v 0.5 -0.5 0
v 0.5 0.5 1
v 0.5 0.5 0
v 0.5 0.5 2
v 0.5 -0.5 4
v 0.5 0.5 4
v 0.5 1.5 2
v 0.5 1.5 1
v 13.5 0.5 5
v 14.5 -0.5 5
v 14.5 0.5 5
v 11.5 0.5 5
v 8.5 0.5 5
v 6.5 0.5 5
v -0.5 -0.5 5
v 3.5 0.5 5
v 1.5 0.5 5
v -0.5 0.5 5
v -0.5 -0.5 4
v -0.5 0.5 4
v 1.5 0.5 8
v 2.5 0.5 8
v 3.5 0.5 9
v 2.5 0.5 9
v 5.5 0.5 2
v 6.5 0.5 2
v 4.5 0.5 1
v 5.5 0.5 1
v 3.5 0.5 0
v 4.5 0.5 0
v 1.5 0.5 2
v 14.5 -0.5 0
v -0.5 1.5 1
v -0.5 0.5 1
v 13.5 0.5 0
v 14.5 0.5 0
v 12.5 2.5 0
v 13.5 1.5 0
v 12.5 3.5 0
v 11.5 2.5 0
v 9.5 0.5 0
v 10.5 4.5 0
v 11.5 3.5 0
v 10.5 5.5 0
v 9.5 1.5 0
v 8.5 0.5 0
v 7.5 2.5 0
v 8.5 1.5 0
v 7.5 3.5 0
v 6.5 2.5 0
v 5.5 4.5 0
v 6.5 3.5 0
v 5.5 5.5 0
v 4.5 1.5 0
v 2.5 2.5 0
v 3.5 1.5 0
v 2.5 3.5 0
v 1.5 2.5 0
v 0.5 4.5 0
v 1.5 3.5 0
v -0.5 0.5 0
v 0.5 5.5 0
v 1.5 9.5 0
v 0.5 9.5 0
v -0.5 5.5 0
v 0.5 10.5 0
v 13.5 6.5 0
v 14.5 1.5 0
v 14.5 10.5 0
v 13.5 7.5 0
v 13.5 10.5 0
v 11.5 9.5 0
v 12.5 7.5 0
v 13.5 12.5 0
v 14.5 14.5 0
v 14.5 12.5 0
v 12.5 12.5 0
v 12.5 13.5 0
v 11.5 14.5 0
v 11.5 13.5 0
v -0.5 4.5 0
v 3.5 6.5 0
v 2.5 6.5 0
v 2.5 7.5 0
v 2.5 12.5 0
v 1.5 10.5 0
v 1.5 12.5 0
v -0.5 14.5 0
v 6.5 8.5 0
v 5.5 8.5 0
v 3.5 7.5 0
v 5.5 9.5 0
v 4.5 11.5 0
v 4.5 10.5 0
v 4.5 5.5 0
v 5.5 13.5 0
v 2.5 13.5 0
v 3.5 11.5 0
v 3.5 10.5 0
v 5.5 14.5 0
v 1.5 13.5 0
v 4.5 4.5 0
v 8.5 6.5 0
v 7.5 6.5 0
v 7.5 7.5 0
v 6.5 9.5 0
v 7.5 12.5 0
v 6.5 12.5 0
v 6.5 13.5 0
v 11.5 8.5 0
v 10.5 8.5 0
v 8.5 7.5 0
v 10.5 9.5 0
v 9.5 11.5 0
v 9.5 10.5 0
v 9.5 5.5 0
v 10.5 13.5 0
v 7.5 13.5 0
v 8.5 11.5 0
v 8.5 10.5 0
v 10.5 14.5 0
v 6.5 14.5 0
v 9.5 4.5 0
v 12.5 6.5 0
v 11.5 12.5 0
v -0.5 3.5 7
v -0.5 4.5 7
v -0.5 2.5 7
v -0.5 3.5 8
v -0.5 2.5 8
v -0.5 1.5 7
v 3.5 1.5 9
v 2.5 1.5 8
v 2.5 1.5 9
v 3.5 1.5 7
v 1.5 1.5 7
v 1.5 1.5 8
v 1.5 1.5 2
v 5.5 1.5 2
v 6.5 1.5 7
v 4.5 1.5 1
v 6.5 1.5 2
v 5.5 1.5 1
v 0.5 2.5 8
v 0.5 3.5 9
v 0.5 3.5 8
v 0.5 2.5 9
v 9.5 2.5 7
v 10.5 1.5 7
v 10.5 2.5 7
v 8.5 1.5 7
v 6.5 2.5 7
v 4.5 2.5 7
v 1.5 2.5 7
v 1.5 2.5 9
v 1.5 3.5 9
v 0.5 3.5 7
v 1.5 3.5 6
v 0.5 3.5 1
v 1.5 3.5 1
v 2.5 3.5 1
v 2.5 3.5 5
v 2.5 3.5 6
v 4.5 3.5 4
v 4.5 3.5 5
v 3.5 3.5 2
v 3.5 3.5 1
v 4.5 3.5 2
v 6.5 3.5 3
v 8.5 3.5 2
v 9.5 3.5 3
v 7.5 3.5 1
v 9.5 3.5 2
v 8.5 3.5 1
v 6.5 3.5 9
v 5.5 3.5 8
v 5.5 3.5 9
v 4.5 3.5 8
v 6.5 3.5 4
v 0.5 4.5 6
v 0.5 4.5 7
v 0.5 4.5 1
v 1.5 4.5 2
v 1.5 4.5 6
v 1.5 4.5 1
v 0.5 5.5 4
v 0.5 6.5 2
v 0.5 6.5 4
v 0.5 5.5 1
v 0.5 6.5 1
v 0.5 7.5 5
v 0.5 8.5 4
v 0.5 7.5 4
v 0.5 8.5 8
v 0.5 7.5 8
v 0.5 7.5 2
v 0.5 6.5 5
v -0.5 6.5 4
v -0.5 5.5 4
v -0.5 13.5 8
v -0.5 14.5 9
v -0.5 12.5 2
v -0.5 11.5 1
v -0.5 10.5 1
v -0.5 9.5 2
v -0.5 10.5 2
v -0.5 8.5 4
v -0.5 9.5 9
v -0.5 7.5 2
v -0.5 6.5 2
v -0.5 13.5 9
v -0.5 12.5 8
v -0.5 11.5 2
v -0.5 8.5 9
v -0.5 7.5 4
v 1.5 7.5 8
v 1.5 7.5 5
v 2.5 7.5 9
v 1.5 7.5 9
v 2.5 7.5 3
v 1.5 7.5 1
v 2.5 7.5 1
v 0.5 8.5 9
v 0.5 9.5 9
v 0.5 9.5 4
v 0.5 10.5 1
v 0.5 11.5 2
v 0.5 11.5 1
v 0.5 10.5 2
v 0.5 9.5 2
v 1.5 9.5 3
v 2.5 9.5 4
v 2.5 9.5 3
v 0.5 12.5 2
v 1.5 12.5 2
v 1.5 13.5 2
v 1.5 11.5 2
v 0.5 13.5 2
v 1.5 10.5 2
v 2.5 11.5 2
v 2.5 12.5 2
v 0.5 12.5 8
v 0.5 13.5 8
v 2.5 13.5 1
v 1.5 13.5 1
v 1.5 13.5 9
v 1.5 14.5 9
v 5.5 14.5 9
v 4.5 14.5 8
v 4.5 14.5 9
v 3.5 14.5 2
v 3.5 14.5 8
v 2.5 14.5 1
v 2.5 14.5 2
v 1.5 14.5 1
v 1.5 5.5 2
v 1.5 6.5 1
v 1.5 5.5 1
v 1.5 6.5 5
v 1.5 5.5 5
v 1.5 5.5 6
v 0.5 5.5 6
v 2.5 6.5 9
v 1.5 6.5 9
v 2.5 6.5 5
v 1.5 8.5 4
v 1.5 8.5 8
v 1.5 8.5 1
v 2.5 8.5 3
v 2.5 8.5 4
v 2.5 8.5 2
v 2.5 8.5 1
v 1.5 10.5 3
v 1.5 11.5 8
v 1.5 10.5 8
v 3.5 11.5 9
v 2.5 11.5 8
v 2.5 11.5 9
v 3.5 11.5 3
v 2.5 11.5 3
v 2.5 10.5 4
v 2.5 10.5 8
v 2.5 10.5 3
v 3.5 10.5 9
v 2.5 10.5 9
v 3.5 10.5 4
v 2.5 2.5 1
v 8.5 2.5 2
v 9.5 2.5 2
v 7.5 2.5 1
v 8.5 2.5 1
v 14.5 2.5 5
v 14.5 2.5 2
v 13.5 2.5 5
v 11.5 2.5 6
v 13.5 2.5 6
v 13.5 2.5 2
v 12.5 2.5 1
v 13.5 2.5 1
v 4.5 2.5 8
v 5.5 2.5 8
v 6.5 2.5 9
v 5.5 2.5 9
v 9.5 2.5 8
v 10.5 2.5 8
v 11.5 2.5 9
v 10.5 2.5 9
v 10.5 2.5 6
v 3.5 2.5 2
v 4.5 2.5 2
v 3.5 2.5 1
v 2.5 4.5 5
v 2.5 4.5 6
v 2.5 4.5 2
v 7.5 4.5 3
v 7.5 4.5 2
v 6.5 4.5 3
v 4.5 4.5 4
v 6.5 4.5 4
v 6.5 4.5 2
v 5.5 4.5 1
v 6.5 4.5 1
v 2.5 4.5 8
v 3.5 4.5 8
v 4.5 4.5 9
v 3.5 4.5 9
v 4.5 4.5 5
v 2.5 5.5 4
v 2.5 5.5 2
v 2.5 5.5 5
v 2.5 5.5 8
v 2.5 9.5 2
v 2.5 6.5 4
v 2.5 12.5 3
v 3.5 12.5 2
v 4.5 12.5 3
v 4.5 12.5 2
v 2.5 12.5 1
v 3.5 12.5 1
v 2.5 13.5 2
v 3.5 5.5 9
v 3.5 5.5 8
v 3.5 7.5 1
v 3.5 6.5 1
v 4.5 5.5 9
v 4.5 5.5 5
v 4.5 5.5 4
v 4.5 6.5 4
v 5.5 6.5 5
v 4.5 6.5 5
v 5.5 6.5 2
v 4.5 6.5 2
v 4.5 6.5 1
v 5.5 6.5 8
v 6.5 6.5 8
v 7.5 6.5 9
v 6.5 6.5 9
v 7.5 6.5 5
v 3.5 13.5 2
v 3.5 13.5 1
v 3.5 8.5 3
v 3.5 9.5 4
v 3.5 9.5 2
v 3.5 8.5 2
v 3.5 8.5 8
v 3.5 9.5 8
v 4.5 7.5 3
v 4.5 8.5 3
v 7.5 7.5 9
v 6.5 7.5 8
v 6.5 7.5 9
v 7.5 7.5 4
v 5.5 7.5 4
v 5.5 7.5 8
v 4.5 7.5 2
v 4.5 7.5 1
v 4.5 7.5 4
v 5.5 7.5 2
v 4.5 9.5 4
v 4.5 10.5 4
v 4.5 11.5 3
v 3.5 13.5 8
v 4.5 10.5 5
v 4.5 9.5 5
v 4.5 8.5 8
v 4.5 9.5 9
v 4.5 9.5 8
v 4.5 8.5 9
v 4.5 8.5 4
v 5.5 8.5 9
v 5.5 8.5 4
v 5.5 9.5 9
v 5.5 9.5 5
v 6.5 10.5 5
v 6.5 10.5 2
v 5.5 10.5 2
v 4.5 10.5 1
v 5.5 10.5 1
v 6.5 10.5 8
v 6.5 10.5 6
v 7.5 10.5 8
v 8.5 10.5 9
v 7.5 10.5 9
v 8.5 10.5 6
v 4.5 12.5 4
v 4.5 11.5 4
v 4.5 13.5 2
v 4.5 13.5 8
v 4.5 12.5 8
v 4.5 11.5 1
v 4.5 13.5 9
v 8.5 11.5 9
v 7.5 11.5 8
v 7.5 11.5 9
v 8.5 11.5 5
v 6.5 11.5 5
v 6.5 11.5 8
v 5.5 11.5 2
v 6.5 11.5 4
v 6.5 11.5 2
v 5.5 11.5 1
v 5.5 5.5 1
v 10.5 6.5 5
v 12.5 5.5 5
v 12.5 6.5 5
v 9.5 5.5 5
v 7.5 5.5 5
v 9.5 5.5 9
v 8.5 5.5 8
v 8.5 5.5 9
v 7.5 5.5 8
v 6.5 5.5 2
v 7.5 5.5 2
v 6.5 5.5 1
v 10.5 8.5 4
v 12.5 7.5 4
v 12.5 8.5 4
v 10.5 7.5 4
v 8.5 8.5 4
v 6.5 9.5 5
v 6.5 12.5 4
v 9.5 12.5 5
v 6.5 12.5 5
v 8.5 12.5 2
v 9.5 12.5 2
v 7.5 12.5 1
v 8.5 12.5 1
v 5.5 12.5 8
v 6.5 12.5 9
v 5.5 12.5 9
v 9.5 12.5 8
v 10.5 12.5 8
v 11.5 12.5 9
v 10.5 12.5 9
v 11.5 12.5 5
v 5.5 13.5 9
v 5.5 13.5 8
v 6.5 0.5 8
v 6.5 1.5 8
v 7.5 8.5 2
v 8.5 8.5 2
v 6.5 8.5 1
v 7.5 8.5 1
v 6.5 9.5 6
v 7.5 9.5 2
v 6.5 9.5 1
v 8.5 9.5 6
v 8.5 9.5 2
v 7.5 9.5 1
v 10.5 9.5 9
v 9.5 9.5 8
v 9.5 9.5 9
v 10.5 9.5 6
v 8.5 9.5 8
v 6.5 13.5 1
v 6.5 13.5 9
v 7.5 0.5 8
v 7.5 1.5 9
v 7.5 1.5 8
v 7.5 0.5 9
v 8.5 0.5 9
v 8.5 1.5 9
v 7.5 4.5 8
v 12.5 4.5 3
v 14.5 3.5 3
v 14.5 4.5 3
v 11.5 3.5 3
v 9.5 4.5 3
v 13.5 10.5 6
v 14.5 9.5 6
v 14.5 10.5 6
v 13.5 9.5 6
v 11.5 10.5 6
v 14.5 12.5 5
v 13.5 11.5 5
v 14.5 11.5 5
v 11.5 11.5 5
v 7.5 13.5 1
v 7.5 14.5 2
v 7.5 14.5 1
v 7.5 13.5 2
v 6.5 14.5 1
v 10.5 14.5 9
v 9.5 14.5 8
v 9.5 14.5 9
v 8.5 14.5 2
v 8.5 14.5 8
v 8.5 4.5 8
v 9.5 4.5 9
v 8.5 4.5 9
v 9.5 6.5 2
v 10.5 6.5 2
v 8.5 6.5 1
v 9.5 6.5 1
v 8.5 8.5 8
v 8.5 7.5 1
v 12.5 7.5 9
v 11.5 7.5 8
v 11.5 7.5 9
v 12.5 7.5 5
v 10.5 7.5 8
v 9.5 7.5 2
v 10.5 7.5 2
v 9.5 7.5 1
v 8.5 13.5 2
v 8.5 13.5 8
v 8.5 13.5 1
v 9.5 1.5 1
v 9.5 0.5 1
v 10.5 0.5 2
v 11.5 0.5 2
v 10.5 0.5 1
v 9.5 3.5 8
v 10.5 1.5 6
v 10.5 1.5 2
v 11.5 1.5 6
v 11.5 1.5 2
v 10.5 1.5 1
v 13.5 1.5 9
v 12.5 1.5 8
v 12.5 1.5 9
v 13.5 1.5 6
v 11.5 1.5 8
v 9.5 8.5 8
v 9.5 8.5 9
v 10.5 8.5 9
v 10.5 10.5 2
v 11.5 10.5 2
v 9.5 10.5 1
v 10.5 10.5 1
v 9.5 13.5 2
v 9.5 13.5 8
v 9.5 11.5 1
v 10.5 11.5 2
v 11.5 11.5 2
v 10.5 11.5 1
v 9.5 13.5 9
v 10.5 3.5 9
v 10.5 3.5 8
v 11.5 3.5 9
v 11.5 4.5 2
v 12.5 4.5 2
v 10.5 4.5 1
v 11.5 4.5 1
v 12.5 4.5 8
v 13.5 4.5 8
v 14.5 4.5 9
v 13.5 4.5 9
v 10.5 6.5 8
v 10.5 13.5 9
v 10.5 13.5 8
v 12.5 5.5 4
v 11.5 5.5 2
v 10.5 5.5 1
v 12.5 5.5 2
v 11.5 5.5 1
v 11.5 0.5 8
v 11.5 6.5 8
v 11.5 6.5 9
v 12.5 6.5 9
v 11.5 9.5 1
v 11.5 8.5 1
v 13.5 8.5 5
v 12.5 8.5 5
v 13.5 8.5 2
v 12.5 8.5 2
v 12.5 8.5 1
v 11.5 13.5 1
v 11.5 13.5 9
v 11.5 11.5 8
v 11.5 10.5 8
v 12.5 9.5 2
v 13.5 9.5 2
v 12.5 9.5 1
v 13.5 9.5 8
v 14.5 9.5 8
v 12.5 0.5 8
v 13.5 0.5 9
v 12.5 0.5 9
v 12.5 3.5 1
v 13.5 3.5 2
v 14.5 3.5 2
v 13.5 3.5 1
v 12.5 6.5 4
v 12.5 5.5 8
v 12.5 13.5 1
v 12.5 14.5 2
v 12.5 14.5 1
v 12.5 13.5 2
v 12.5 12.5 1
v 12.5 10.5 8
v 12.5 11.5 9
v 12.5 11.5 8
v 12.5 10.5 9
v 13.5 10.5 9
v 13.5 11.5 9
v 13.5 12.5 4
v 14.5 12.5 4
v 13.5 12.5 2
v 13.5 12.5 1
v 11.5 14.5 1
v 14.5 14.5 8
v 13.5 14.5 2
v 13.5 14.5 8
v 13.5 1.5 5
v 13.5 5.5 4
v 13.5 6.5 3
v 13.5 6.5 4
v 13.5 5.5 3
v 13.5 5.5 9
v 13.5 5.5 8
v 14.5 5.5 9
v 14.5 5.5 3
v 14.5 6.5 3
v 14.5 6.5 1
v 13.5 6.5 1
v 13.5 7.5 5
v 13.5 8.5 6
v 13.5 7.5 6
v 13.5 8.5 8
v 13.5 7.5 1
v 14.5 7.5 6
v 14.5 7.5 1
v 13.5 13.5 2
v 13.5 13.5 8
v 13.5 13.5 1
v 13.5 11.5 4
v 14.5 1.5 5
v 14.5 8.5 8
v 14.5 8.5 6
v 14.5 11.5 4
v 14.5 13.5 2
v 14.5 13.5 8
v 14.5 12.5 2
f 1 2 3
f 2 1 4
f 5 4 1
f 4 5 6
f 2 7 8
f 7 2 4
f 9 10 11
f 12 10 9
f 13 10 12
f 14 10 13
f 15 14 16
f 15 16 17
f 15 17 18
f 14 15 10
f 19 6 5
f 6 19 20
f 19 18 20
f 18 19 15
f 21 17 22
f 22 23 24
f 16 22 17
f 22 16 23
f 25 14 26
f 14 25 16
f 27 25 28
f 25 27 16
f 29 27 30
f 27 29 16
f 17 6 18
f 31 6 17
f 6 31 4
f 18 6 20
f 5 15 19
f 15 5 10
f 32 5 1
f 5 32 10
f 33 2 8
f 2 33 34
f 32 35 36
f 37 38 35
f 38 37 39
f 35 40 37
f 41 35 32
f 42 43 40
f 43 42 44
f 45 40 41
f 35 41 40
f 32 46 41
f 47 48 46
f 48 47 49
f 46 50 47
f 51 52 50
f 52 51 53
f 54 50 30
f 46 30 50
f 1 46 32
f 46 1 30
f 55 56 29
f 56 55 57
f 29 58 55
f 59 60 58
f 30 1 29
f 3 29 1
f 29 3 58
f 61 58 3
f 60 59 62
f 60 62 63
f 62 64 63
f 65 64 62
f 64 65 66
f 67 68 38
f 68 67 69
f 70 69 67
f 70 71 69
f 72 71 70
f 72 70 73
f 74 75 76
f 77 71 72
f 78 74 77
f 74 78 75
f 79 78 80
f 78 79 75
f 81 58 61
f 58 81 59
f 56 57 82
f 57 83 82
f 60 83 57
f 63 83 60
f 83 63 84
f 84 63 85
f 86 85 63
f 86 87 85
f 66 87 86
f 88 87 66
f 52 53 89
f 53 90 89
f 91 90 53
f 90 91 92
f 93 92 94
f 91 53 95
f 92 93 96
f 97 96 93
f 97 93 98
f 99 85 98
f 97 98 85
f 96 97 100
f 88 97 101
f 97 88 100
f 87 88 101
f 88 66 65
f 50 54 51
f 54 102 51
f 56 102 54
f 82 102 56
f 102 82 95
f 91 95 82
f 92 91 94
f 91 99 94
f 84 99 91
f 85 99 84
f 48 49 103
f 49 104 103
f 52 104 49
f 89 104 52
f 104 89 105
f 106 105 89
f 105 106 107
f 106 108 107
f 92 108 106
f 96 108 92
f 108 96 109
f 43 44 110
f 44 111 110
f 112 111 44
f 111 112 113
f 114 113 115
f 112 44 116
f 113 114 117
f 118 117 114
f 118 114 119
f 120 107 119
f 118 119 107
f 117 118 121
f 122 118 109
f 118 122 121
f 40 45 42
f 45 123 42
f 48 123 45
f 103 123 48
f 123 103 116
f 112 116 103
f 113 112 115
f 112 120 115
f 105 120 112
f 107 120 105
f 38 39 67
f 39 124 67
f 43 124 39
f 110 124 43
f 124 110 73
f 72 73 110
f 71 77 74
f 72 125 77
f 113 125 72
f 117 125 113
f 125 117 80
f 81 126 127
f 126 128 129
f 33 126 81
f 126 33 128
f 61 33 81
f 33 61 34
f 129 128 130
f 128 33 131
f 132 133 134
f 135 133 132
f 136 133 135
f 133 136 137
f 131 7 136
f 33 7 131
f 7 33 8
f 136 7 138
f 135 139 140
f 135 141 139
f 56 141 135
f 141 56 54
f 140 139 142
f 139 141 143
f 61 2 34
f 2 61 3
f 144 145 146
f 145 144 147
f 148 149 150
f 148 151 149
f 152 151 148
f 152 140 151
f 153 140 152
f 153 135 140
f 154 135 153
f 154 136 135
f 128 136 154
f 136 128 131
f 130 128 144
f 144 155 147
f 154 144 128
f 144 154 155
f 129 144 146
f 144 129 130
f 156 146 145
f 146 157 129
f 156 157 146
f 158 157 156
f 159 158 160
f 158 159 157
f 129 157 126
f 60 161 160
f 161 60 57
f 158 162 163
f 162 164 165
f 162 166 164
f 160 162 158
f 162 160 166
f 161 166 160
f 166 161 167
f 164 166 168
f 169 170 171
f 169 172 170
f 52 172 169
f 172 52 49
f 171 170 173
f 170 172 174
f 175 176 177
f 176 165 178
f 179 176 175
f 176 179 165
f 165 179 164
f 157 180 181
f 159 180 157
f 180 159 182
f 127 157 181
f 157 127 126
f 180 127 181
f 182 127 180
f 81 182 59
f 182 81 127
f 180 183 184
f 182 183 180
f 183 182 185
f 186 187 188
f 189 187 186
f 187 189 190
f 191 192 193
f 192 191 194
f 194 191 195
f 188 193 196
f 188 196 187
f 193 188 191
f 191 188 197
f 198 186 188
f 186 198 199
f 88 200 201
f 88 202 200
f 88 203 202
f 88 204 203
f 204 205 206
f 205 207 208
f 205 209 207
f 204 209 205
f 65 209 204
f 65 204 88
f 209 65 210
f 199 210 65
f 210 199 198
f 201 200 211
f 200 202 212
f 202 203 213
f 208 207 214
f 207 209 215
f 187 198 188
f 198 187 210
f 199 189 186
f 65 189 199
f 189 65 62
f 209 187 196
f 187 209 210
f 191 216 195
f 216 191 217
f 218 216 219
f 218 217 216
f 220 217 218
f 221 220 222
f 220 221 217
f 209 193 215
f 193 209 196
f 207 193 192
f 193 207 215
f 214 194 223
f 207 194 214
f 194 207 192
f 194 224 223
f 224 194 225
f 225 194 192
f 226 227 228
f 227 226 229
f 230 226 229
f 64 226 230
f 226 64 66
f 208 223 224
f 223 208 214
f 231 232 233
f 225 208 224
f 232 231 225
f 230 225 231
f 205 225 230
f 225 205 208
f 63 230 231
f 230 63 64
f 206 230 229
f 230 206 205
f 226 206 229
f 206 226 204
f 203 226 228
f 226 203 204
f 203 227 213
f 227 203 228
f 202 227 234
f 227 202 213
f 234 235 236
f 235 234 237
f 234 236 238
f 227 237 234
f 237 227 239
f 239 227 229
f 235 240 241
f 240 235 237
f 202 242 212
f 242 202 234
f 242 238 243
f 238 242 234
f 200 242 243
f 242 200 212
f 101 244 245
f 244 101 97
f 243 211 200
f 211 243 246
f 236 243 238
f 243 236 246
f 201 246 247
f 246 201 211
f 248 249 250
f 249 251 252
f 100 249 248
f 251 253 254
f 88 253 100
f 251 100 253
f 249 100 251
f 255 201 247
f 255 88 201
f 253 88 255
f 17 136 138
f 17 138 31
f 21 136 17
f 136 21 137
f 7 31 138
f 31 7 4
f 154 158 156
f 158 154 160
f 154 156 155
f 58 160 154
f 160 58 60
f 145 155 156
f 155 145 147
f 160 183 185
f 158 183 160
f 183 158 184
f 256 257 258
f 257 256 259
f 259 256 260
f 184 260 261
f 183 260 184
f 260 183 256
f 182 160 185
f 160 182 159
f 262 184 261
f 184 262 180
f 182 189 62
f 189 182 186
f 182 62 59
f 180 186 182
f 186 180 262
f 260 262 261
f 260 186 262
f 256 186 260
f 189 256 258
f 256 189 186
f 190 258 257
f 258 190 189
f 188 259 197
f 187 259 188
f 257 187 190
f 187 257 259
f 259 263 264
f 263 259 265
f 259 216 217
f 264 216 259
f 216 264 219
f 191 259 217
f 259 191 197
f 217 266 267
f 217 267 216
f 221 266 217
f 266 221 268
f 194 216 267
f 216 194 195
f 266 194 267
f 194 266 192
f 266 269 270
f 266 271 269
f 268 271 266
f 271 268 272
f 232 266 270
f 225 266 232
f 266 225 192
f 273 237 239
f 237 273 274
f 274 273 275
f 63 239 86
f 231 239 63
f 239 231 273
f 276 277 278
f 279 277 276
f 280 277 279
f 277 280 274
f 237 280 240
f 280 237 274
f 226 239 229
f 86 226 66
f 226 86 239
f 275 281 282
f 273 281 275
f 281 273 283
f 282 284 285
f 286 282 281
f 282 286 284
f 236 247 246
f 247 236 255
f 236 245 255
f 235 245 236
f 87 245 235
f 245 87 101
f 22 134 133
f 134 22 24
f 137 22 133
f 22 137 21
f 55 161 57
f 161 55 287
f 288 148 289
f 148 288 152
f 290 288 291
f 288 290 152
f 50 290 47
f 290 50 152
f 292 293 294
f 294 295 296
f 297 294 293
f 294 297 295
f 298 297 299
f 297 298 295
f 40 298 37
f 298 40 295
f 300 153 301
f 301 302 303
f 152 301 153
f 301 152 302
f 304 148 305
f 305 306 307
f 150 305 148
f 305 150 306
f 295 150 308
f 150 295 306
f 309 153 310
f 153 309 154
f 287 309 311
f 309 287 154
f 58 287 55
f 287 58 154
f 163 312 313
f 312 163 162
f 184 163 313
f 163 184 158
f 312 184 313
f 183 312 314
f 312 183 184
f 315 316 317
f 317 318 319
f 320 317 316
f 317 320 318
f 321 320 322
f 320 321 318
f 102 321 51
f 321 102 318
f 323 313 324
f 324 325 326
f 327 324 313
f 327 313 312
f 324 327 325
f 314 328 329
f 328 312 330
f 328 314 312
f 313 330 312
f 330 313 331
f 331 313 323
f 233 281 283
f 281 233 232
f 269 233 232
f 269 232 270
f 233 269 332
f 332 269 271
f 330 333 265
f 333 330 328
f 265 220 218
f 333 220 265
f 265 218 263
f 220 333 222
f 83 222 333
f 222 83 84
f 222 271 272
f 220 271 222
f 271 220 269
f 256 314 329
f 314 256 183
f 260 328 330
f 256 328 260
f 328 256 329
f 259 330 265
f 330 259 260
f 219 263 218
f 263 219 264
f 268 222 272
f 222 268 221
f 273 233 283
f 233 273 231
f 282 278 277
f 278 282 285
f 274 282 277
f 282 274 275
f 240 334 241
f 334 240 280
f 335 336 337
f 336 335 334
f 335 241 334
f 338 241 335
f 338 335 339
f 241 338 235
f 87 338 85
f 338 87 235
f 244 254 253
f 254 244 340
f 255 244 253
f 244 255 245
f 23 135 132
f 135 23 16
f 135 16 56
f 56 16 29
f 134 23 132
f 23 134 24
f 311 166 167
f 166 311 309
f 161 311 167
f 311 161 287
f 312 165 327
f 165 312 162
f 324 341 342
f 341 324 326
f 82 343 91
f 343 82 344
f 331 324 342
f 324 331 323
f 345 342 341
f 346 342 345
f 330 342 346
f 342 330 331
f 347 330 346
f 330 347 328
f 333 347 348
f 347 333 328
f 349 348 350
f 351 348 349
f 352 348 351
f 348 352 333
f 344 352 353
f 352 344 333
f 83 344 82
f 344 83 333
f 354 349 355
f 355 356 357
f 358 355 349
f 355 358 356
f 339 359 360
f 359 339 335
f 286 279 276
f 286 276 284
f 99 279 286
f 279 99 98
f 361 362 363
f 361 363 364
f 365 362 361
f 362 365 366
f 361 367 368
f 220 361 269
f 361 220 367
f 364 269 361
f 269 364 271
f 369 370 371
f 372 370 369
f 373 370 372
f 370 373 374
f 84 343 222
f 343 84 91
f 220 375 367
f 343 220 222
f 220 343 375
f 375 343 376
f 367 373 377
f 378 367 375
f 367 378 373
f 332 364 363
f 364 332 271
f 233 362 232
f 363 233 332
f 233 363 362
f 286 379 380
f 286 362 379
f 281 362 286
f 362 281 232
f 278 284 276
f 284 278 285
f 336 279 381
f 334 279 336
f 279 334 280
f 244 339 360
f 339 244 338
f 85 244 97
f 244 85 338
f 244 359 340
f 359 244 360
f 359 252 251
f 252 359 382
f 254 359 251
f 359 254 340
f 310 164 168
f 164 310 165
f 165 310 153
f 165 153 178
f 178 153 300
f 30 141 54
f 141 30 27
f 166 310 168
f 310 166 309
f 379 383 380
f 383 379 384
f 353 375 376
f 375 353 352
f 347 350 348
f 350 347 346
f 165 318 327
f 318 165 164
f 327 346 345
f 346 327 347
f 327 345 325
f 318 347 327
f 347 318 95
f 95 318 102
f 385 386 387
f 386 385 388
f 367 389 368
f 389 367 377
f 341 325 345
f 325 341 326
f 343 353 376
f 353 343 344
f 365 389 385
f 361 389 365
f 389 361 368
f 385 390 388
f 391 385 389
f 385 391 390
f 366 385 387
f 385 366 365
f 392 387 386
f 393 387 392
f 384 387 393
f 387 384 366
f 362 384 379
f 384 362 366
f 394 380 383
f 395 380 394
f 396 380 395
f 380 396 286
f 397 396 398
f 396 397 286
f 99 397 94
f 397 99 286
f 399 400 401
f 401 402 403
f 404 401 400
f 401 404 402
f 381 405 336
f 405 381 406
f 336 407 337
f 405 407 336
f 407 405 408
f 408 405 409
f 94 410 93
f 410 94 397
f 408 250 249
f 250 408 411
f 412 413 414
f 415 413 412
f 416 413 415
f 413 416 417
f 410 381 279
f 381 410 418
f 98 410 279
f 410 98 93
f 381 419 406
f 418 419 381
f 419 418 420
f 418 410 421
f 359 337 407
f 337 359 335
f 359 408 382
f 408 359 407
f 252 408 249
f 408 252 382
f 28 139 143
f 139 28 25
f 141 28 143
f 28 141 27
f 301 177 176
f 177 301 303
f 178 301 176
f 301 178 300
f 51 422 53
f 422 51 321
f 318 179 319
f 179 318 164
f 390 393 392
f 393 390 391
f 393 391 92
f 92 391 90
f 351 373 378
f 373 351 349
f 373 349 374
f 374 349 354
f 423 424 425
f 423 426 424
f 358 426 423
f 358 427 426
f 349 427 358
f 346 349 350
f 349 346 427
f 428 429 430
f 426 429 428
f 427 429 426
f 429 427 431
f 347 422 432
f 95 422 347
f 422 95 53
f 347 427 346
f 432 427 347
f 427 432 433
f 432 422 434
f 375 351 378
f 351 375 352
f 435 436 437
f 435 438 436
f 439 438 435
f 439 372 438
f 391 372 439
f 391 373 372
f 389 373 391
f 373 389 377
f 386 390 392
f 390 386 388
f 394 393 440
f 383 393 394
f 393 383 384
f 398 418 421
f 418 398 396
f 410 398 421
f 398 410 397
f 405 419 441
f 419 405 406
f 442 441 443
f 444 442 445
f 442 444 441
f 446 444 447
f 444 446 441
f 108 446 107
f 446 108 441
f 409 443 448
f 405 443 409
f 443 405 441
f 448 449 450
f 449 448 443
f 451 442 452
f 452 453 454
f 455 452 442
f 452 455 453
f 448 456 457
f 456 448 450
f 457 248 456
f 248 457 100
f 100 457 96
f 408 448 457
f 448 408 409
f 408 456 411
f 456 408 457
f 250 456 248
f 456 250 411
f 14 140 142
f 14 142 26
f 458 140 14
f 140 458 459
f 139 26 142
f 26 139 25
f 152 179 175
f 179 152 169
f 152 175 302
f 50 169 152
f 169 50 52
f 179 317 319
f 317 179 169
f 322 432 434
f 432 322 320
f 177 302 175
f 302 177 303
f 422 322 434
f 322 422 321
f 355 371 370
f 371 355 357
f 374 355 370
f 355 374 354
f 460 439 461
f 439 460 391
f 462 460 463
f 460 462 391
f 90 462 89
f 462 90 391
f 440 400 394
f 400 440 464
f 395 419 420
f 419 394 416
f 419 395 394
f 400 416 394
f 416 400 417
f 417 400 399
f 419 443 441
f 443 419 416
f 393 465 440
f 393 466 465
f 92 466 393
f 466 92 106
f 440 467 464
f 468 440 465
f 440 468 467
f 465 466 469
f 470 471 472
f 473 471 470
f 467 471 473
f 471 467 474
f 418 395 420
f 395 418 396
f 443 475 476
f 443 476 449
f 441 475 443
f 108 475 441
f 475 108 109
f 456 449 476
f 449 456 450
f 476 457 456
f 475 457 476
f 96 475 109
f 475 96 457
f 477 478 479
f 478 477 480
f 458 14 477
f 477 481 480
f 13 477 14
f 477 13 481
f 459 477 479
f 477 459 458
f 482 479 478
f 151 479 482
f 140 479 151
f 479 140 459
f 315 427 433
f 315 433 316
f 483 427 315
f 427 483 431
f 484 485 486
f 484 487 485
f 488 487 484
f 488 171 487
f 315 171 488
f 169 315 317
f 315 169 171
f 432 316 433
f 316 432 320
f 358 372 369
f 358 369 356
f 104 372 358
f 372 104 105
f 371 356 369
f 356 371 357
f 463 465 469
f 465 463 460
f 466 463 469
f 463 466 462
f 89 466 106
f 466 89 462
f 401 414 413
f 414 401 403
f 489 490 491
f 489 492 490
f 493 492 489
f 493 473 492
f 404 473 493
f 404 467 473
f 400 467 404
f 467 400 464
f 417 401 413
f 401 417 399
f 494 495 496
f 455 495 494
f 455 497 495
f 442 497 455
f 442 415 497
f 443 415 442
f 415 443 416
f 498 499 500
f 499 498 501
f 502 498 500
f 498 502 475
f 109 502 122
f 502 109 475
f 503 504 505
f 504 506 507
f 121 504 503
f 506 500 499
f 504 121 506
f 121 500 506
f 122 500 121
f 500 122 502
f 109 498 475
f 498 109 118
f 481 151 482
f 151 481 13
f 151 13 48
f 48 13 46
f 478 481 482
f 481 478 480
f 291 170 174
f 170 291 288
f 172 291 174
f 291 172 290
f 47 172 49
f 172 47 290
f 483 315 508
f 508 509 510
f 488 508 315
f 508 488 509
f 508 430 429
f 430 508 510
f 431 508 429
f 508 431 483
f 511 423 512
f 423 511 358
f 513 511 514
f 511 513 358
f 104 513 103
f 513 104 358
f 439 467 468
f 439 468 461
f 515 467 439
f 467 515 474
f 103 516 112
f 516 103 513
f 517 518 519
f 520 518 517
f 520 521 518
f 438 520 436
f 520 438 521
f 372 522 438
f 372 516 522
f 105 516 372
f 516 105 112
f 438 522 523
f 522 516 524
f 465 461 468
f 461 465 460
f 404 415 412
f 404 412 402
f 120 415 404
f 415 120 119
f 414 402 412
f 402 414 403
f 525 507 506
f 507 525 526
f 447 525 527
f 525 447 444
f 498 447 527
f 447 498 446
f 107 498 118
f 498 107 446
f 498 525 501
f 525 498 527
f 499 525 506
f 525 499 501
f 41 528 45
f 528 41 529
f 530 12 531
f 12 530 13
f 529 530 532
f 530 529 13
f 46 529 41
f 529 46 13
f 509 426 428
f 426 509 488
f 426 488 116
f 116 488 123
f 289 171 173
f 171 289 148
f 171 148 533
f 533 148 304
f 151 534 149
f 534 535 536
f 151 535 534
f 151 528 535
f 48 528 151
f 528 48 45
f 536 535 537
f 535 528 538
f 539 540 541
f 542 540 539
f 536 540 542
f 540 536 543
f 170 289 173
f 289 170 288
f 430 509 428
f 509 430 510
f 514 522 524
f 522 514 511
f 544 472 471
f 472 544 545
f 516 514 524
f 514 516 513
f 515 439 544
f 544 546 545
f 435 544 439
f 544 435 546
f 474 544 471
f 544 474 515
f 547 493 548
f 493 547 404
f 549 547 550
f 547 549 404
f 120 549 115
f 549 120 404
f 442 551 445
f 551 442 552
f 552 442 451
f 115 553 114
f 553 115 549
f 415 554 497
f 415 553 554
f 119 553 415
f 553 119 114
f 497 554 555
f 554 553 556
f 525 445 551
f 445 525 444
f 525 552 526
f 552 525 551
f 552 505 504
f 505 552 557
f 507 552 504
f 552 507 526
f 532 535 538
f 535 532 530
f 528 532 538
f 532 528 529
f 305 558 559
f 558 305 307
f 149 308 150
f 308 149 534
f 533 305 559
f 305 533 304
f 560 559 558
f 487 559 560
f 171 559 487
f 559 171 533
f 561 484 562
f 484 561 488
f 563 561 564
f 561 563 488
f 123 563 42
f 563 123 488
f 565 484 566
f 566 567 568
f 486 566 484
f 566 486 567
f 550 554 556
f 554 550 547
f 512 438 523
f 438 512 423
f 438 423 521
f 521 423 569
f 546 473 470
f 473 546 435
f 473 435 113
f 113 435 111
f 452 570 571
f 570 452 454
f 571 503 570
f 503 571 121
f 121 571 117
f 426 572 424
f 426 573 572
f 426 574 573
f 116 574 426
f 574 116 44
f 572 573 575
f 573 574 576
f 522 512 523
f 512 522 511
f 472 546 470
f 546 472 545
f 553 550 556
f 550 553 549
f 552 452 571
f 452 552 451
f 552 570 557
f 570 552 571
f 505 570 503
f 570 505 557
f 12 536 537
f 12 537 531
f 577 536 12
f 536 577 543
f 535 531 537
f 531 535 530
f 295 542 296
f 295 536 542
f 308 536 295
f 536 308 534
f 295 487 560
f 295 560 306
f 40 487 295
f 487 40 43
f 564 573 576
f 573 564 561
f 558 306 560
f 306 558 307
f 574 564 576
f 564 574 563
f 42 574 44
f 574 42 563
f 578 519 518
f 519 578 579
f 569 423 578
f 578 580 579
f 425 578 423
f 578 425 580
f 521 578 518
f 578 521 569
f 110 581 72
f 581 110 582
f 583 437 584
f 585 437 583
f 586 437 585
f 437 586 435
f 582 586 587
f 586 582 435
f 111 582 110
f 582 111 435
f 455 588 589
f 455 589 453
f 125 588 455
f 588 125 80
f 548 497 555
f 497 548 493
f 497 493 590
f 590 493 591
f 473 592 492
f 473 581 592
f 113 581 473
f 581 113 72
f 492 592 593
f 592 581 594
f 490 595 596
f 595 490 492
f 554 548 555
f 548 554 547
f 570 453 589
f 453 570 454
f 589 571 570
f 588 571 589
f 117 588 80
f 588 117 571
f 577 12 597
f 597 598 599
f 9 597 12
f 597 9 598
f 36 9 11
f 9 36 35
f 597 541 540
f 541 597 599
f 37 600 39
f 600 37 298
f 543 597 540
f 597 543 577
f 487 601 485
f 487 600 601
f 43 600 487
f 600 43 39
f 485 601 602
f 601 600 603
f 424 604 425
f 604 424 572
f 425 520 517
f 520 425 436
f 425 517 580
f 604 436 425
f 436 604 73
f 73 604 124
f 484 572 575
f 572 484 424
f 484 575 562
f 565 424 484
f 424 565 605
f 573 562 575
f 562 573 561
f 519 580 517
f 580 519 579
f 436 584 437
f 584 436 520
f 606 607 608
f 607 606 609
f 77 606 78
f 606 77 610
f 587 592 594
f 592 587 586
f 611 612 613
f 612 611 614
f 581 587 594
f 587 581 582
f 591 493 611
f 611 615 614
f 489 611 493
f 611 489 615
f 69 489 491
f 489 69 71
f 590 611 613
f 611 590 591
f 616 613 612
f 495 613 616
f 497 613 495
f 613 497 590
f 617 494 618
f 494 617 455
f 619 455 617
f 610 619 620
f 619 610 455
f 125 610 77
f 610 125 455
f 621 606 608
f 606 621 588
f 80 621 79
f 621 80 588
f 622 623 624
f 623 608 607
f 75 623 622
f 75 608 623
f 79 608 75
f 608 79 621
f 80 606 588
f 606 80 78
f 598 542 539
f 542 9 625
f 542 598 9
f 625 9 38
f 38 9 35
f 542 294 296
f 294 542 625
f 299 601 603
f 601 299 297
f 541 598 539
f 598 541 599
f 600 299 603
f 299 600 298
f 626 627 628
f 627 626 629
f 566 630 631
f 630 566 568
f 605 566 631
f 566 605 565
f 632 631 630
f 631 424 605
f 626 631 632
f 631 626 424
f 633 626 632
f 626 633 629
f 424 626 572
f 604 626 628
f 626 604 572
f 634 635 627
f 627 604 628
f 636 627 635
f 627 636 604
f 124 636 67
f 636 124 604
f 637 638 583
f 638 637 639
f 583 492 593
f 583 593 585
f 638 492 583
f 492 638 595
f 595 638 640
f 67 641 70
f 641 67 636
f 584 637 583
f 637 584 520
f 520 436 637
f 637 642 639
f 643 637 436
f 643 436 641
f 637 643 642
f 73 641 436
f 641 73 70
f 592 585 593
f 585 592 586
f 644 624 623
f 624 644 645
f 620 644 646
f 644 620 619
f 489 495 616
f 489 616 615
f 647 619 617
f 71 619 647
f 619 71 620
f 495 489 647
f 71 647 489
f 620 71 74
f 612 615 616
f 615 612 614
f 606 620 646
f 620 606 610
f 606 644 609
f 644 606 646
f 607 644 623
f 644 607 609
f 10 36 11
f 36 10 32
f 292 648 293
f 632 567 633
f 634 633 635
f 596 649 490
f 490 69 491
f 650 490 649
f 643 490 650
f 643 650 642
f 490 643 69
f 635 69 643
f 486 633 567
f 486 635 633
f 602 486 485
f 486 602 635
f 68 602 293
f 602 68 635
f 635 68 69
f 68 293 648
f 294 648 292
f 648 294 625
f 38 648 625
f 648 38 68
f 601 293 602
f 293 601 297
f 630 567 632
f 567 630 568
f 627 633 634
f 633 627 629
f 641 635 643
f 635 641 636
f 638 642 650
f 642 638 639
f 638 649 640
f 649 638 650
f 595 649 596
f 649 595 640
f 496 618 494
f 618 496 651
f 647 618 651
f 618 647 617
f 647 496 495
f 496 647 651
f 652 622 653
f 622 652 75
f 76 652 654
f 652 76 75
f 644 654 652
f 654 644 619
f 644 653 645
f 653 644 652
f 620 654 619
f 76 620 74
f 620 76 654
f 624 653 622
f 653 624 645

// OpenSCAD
union() {
    translate([0, 0, 4.5]) color([1, 0, 0]) cube([1, 1, 1], center=true);
    translate([0, 1, 0.5]) cube([1, 1, 1], center=true);
    translate([0, 2, 3.5]) cube([1, 1, 7], center=true);
    translate([0, 3, 4.0]) cube([1, 1, 8], center=true);
    translate([0, 4, 3.5]) cube([1, 1, 7], center=true);
    translate([0, 6, 2.0]) cube([1, 1, 4], center=true);
    translate([0, 7, 1.0]) cube([1, 1, 2], center=true);
    translate([0, 8, 2.0]) cube([1, 1, 4], center=true);
    translate([0, 9, 4.5]) cube([1, 1, 9], center=true);
    translate([0, 10, 1.0]) cube([1, 1, 2], center=true);
    translate([0, 11, 0.5]) cube([1, 1, 1], center=true);
    translate([0, 12, 1.0]) cube([1, 1, 2], center=true);
    translate([0, 13, 4.0]) cube([1, 1, 8], center=true);
    translate([0, 14, 4.5]) cube([1, 1, 9], center=true);
    translate([1, 0, 2.5]) cube([1, 1, 5], center=true);
    translate([1, 1, 1.0]) cube([1, 1, 2], center=true);
    translate([1, 2, 3.5]) cube([1, 1, 7], center=true);
    translate([1, 3, 4.5]) cube([1, 1, 9], center=true);
    translate([1, 4, 0.5]) cube([1, 1, 1], center=true);
    translate([1, 5, 3.0]) cube([1, 1, 6], center=true);
    translate([1, 6, 0.5]) cube([1, 1, 1], center=true);
    translate([1, 7, 2.5]) cube([1, 1, 5], center=true);
    translate([1, 8, 4.0]) cube([1, 1, 8], center=true);
    translate([1, 9, 2.0]) cube([1, 1, 4], center=true);
    translate([1, 11, 1.0]) cube([1, 1, 2], center=true);
    translate([1, 12, 1.0]) cube([1, 1, 2], center=true);
    translate([1, 13, 1.0]) cube([1, 1, 2], center=true);
    translate([1, 14, 4.5]) cube([1, 1, 9], center=true);
    translate([2, 0, 2.5]) cube([1, 1, 5], center=true);
    translate([2, 1, 4.0]) cube([1, 1, 8], center=true);
    translate([2, 2, 3.5]) cube([1, 1, 7], center=true);
    translate([2, 4, 3.0]) cube([1, 1, 6], center=true);
    translate([2, 5, 1.0]) cube([1, 1, 2], center=true);
    translate([2, 6, 2.5]) cube([1, 1, 5], center=true);
    translate([2, 7, 4.5]) cube([1, 1, 9], center=true);
    translate([2, 8, 0.5]) cube([1, 1, 1], center=true);
    translate([2, 9, 2.0]) cube([1, 1, 4], center=true);
    translate([2, 10, 1.5]) cube([1, 1, 3], center=true);
    translate([2, 11, 4.0]) cube([1, 1, 8], center=true);
    translate([2, 12, 1.0]) cube([1, 1, 2], center=true);
    translate([2, 14, 0.5]) cube([1, 1, 1], center=true);
    translate([3, 0, 2.5]) cube([1, 1, 5], center=true);
    translate([3, 1, 4.5]) cube([1, 1, 9], center=true);
    translate([3, 2, 3.5]) cube([1, 1, 7], center=true);
    translate([3, 3, 0.5]) cube([1, 1, 1], center=true);
    translate([3, 4, 2.5]) cube([1, 1, 5], center=true);
    translate([3, 5, 4.0]) cube([1, 1, 8], center=true);
    translate([3, 6, 2.0]) cube([1, 1, 4], center=true);
    translate([3, 8, 1.5]) cube([1, 1, 3], center=true);
    translate([3, 9, 1.0]) cube([1, 1, 2], center=true);
    translate([3, 10, 2.0]) cube([1, 1, 4], center=true);
    translate([3, 11, 4.5]) cube([1, 1, 9], center=true);
    translate([3, 12, 1.5]) cube([1, 1, 3], center=true);
    translate([3, 13, 0.5]) cube([1, 1, 1], center=true);
    translate([3, 14, 1.0]) cube([1, 1, 2], center=true);
    translate([4, 0, 2.5]) cube([1, 1, 5], center=true);
    translate([4, 2, 3.5]) cube([1, 1, 7], center=true);
    translate([4, 3, 1.0]) cube([1, 1, 2], center=true);
    translate([4, 4, 2.5]) cube([1, 1, 5], center=true);
    translate([4, 5, 4.5]) cube([1, 1, 9], center=true);
    translate([4, 6, 2.0]) cube([1, 1, 4], center=true);
    translate([4, 7, 0.5]) cube([1, 1, 1], center=true);
    translate([4, 8, 1.5]) cube([1, 1, 3], center=true);
    translate([4, 9, 4.0]) cube([1, 1, 8], center=true);
    translate([4, 10, 2.0]) cube([1, 1, 4], center=true);
    translate([4, 12, 1.5]) cube([1, 1, 3], center=true);
    translate([4, 13, 1.0]) cube([1, 1, 2], center=true);
    translate([4, 14, 4.0]) cube([1, 1, 8], center=true);
    translate([5, 0, 2.5]) cube([1, 1, 5], center=true);
    translate([5, 1, 0.5]) cube([1, 1, 1], center=true);
    translate([5, 2, 3.5]) cube([1, 1, 7], center=true);
    translate([5, 3, 4.0]) cube([1, 1, 8], center=true);
    translate([5, 4, 2.0]) cube([1, 1, 4], center=true);
    translate([5, 6, 2.5]) cube([1, 1, 5], center=true);
    translate([5, 7, 1.0]) cube([1, 1, 2], center=true);
    translate([5, 8, 2.0]) cube([1, 1, 4], center=true);
    translate([5, 9, 4.5]) cube([1, 1, 9], center=true);
    translate([5, 10, 2.5]) cube([1, 1, 5], center=true);
    translate([5, 11, 0.5]) cube([1, 1, 1], center=true);
    translate([5, 12, 2.0]) cube([1, 1, 4], center=true);
    translate([5, 13, 4.0]) cube([1, 1, 8], center=true);
    translate([5, 14, 4.5]) cube([1, 1, 9], center=true);
    translate([6, 0, 2.5]) cube([1, 1, 5], center=true);
    translate([6, 1, 1.0]) cube([1, 1, 2], center=true);
    translate([6, 2, 3.5]) cube([1, 1, 7], center=true);
    translate([6, 3, 4.5]) cube([1, 1, 9], center=true);
    translate([6, 4, 2.0]) cube([1, 1, 4], center=true);
    translate([6, 5, 0.5]) cube([1, 1, 1], center=true);
    translate([6, 6, 2.5]) cube([1, 1, 5], center=true);
    translate([6, 7, 4.0]) cube([1, 1, 8], center=true);
    translate([6, 8, 2.0]) cube([1, 1, 4], center=true);
    translate([6, 10, 2.5]) cube([1, 1, 5], center=true);
    translate([6, 11, 1.0]) cube([1, 1, 2], center=true);
    translate([6, 12, 2.0]) cube([1, 1, 4], center=true);
    translate([6, 13, 4.5]) cube([1, 1, 9], center=true);
    translate([7, 0, 2.5]) cube([1, 1, 5], center=true);
    translate([7, 1, 4.0]) cube([1, 1, 8], center=true);
    translate([7, 2, 3.5]) cube([1, 1, 7], center=true);
    translate([7, 4, 1.5]) cube([1, 1, 3], center=true);
    translate([7, 5, 1.0]) cube([1, 1, 2], center=true);
    translate([7, 6, 2.5]) cube([1, 1, 5], center=true);
    translate([7, 7, 4.5]) cube([1, 1, 9], center=true);
    translate([7, 8, 2.0]) cube([1, 1, 4], center=true);
    translate([7, 9, 0.5]) cube([1, 1, 1], center=true);
    translate([7, 10, 3.0]) cube([1, 1, 6], center=true);
    translate([7, 11, 4.0]) cube([1, 1, 8], center=true);
    translate([7, 12, 2.5]) cube([1, 1, 5], center=true);
    translate([7, 14, 0.5]) cube([1, 1, 1], center=true);
    translate([8, 0, 2.5]) cube([1, 1, 5], center=true);
    translate([8, 1, 4.5]) cube([1, 1, 9], center=true);
    translate([8, 2, 3.5]) cube([1, 1, 7], center=true);
    translate([8, 3, 0.5]) cube([1, 1, 1], center=true);
    translate([8, 4, 1.5]) cube([1, 1, 3], center=true);
    translate([8, 5, 4.0]) cube([1, 1, 8], center=true);
    translate([8, 6, 2.5]) cube([1, 1, 5], center=true);
    translate([8, 8, 2.0]) cube([1, 1, 4], center=true);
    translate([8, 9, 1.0]) cube([1, 1, 2], center=true);
    translate([8, 10, 3.0]) cube([1, 1, 6], center=true);
    translate([8, 11, 4.5]) cube([1, 1, 9], center=true);
    translate([8, 12, 2.5]) cube([1, 1, 5], center=true);
    translate([8, 13, 0.5]) cube([1, 1, 1], center=true);
    translate([8, 14, 1.0]) cube([1, 1, 2], center=true);
    translate([9, 0, 2.5]) cube([1, 1, 5], center=true);
    translate([9, 2, 3.5]) cube([1, 1, 7], center=true);
    translate([9, 3, 1.0]) cube([1, 1, 2], center=true);
    translate([9, 4, 1.5]) cube([1, 1, 3], center=true);
    translate([9, 5, 4.5]) cube([1, 1, 9], center=true);
    translate([9, 6, 2.5]) cube([1, 1, 5], center=true);
    translate([9, 7, 0.5]) cube([1, 1, 1], center=true);
    translate([9, 8, 2.0]) cube([1, 1, 4], center=true);
    translate([9, 9, 4.0]) cube([1, 1, 8], center=true);
    translate([9, 10, 3.0]) cube([1, 1, 6], center=true);
    translate([9, 12, 2.5]) cube([1, 1, 5], center=true);
    translate([9, 13, 1.0]) cube([1, 1, 2], center=true);
    translate([9, 14, 4.0]) cube([1, 1, 8], center=true);
    translate([10, 0, 2.5]) cube([1, 1, 5], center=true);
    translate([10, 1, 0.5]) cube([1, 1, 1], center=true);
    translate([10, 2, 3.5]) cube([1, 1, 7], center=true);
    translate([10, 3, 4.0]) cube([1, 1, 8], center=true);
    translate([10, 4, 1.5]) cube([1, 1, 3], center=true);
    translate([10, 6, 2.5]) cube([1, 1, 5], center=true);
    translate([10, 7, 1.0]) cube([1, 1, 2], center=true);
    translate([10, 8, 2.0]) cube([1, 1, 4], center=true);
    translate([10, 9, 4.5]) cube([1, 1, 9], center=true);
    translate([10, 10, 3.0]) cube([1, 1, 6], center=true);
    translate([10, 11, 0.5]) cube([1, 1, 1], center=true);
    translate([10, 12, 2.5]) cube([1, 1, 5], center=true);
    translate([10, 13, 4.0]) cube([1, 1, 8], center=true);
    translate([10, 14, 4.5]) cube([1, 1, 9], center=true);
    translate([11, 0, 2.5]) cube([1, 1, 5], center=true);
    translate([11, 1, 1.0]) cube([1, 1, 2], center=true);
    translate([11, 2, 3.0]) cube([1, 1, 6], center=true);
    translate([11, 3, 4.5]) cube([1, 1, 9], center=true);
    translate([11, 4, 1.5]) cube([1, 1, 3], center=true);
    translate([11, 5, 0.5]) cube([1, 1, 1], center=true);
    translate([11, 6, 2.5]) cube([1, 1, 5], center=true);
    translate([11, 7, 4.0]) cube([1, 1, 8], center=true);
    translate([11, 8, 2.0]) cube([1, 1, 4], center=true);
    translate([11, 10, 3.0]) cube([1, 1, 6], center=true);
    translate([11, 11, 1.0]) cube([1, 1, 2], center=true);
    translate([11, 12, 2.5]) cube([1, 1, 5], center=true);
    translate([11, 13, 4.5]) cube([1, 1, 9], center=true);
    translate([12, 0, 2.5]) cube([1, 1, 5], center=true);
    translate([12, 1, 4.0]) cube([1, 1, 8], center=true);
    translate([12, 2, 3.0]) cube([1, 1, 6], center=true);
    translate([12, 4, 1.5]) cube([1, 1, 3], center=true);
    translate([12, 5, 1.0]) cube([1, 1, 2], center=true);
    translate([12, 6, 2.5]) cube([1, 1, 5], center=true);
    translate([12, 7, 4.5]) cube([1, 1, 9], center=true);
    translate([12, 8, 2.0]) cube([1, 1, 4], center=true);
    translate([12, 9, 0.5]) cube([1, 1, 1], center=true);
    translate([12, 10, 3.0]) cube([1, 1, 6], center=true);
    translate([12, 11, 4.0]) cube([1, 1, 8], center=true);
    translate([12, 12, 2.5]) cube([1, 1, 5], center=true);
    translate([12, 14, 0.5]) cube([1, 1, 1], center=true);
    translate([13, 0, 2.5]) cube([1, 1, 5], center=true);
    translate([13, 1, 4.5]) cube([1, 1, 9], center=true);
    translate([13, 2, 3.0]) cube([1, 1, 6], center=true);
    translate([13, 3, 0.5]) cube([1, 1, 1], center=true);
    translate([13, 4, 1.5]) cube([1, 1, 3], center=true);
    translate([13, 5, 4.0]) cube([1, 1, 8], center=true);
    translate([13, 6, 2.0]) cube([1, 1, 4], center=true);
    translate([13, 8, 2.5]) cube([1, 1, 5], center=true);
    translate([13, 9, 1.0]) cube([1, 1, 2], center=true);
    translate([13, 10, 3.0]) cube([1, 1, 6], center=true);
    translate([13, 11, 4.5]) cube([1, 1, 9], center=true);
    translate([13, 12, 2.5]) cube([1, 1, 5], center=true);
    translate([13, 13, 0.5]) cube([1, 1, 1], center=true);
    translate([13, 14, 1.0]) cube([1, 1, 2], center=true);
    translate([14, 0, 2.5]) cube([1, 1, 5], center=true);
    translate([14, 2, 2.5]) cube([1, 1, 5], center=true);
    translate([14, 3, 1.0]) cube([1, 1, 2], center=true);
    translate([14, 4, 1.5]) cube([1, 1, 3], center=true);
    translate([14, 5, 4.5]) cube([1, 1, 9], center=true);
    translate([14, 6, 1.5]) cube([1, 1, 3], center=true);
    translate([14, 7, 0.5]) cube([1, 1, 1], center=true);
    translate([14, 8, 3.0]) cube([1, 1, 6], center=true);
    translate([14, 9, 4.0]) cube([1, 1, 8], center=true);
    translate([14, 10, 3.0]) cube([1, 1, 6], center=true);
    translate([14, 12, 4.5]) color([0, 0, 1]) cube([1, 1, 1], center=true);
    translate([14, 13, 1.0]) cube([1, 1, 2], center=true);
    translate([14, 14, 4.0]) cube([1, 1, 8], center=true);
}
